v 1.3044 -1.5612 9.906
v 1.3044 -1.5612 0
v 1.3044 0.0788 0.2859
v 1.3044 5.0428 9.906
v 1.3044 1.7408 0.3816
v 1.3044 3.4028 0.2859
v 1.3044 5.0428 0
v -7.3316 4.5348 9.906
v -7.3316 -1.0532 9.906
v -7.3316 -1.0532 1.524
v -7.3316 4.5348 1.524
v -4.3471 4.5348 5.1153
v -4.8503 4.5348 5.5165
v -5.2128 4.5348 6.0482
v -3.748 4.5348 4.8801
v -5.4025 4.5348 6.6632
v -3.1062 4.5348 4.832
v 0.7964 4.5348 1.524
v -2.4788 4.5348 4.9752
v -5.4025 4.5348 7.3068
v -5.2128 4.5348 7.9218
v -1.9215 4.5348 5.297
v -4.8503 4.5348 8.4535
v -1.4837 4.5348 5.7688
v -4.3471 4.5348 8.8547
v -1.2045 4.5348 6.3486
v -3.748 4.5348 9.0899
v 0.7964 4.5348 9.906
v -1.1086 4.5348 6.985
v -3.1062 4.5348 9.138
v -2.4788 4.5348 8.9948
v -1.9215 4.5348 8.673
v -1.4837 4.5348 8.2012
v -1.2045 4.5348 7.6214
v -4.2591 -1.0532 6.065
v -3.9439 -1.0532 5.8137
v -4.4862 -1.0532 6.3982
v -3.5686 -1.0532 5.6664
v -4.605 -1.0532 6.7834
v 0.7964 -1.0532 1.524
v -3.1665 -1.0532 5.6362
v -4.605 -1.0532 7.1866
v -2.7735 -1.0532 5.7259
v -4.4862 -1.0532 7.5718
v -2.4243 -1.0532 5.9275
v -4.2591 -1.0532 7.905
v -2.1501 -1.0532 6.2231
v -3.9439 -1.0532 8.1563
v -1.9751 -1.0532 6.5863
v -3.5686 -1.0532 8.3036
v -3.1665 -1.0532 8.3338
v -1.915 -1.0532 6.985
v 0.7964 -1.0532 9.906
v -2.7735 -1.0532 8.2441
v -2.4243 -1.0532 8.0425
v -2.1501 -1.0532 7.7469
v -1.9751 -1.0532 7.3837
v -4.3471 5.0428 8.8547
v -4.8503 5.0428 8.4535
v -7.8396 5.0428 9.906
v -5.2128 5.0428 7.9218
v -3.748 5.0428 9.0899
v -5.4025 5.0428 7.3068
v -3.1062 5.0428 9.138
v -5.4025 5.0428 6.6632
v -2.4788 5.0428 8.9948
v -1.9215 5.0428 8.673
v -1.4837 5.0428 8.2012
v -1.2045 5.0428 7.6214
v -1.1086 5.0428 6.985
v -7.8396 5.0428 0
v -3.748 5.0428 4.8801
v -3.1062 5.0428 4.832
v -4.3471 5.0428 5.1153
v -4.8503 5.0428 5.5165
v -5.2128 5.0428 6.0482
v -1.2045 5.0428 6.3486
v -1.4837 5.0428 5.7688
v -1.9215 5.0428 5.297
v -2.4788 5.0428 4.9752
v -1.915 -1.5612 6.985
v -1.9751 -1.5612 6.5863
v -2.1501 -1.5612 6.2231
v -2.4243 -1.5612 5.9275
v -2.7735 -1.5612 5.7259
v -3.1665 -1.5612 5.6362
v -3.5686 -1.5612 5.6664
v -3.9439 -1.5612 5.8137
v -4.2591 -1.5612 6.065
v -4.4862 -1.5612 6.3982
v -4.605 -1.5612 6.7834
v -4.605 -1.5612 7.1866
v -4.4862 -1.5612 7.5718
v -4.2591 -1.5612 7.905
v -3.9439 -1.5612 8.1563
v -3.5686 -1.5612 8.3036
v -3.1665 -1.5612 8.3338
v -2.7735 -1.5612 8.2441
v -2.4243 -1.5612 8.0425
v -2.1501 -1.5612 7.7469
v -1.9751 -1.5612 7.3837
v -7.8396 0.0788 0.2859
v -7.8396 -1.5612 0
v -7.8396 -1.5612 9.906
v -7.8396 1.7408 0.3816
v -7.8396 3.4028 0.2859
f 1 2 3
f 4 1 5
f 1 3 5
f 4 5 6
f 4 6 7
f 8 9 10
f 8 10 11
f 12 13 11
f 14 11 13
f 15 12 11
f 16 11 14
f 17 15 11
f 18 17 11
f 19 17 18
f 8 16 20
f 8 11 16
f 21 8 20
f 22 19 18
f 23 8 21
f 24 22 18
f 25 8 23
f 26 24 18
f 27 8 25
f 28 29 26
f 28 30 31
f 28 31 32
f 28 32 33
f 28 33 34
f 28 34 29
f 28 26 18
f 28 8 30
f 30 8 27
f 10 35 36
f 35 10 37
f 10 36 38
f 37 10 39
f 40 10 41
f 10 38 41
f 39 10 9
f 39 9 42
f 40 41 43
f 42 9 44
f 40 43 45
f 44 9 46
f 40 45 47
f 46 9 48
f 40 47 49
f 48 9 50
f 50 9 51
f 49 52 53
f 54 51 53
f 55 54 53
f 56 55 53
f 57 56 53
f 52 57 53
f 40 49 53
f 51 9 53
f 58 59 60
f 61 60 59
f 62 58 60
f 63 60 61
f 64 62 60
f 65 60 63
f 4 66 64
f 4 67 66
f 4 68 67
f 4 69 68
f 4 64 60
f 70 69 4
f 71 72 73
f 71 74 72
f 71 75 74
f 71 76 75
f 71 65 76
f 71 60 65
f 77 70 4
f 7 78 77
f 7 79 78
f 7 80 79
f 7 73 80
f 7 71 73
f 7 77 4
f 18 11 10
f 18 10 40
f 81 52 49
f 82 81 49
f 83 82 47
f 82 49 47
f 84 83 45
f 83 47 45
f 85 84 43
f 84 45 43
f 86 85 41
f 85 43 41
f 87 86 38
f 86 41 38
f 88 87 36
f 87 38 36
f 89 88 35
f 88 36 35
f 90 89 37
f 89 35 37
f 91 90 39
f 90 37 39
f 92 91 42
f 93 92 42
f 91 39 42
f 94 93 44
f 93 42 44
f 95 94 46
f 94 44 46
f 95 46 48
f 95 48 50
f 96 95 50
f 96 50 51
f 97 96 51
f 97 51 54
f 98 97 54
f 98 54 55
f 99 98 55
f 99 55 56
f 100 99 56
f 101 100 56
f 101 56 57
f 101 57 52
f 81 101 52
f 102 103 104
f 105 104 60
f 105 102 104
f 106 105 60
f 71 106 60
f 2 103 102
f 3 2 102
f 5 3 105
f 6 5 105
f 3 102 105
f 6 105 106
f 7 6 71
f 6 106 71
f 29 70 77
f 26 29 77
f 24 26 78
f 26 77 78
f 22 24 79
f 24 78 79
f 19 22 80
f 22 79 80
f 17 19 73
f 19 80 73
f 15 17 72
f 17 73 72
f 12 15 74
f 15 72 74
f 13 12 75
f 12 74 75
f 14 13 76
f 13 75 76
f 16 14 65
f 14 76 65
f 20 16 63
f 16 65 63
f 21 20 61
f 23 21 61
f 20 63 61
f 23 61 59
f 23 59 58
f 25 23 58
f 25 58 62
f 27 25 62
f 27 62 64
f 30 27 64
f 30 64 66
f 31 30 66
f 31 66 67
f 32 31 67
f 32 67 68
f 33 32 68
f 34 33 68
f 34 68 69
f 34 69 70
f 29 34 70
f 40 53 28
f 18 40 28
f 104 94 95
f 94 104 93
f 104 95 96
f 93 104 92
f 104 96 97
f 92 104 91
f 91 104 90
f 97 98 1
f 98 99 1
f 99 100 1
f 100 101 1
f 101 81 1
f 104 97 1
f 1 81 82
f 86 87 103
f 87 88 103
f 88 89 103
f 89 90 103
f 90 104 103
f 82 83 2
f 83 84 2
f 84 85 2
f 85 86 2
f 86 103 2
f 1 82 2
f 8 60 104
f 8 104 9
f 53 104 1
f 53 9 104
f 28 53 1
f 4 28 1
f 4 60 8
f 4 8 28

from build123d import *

# Parameters (mm, degrees)
SKETCH1_W                 = 9.144
SKETCH1_H                 = 6.604
BOSS_EXTRUDE1_DEPTH       = 9.906
SKETCH4_W                 = 8.128
SKETCH4_H                 = 5.588
CUT_EXTRUDE1_DEPTH        = 8.382
CUT_EXTRUDE2_DEPTH        = 10.144
CUT_EXTRUDE4_REACH        = 8.604
SKETCH11_R                = 2.159
F_6_32_TAPPED_HOLE4_D     = 2.7051
F_6_32_TAPPED_HOLE4_DEPTH = 0.508


with BuildPart() as part:
    # Sketch1 → Boss-Extrude1 (new body)
    with BuildSketch(Plane.XY):
        with Locations((-3.267592039, 1.740807143)):
            Rectangle(SKETCH1_W, SKETCH1_H)
    extrude(amount=BOSS_EXTRUDE1_DEPTH)

    # Sketch4 → Cut-Extrude1 (cut)
    with BuildSketch(Plane.XY.offset(9.906)):
        with Locations((-3.267592039, 1.740807143)):
            Rectangle(SKETCH4_W, SKETCH4_H)
    extrude(amount=-CUT_EXTRUDE1_DEPTH, mode=Mode.SUBTRACT)

    # Sketch8 → Cut-Extrude2 (cut, through all)
    with BuildSketch(Plane.ZY.offset(7.839592039)):
        with BuildLine():
            Line((0, 5.042807143), (0, -1.561192857))
            ThreePointArc((0, -1.561192857), (0.381572084, 1.740807143), (0, 5.042807143))
        make_face()
    extrude(amount=-CUT_EXTRUDE2_DEPTH, mode=Mode.SUBTRACT)

    # Sketch11 → Cut-Extrude4 (cut, up to next)
    with BuildSketch(Plane(origin=(0, 5.042807143, 0), x_dir=(1, 0, 0), z_dir=(0, 1, 0)), mode=Mode.PRIVATE) as cut_extrude4_sk1:
        with Locations((-3.267592039, -6.985)):
            Circle(SKETCH11_R)
    cut_extrude4_tool1 = extrude(cut_extrude4_sk1.sketch, amount=-CUT_EXTRUDE4_REACH, mode=Mode.PRIVATE) & part.part
    add(cut_extrude4_tool1.solids().sort_by_distance((-3.267592, 5.042807, 6.985))[0], mode=Mode.SUBTRACT)

    # #6-32 Tapped Hole4
    with Locations(Plane(origin=(0, -1.561192857, 0), x_dir=(-1, 0, 0), z_dir=(0, -1, 0))):
        with Locations((3.267592039, -6.985)):
            Hole(F_6_32_TAPPED_HOLE4_D / 2, depth=F_6_32_TAPPED_HOLE4_DEPTH)


solid = part.part
